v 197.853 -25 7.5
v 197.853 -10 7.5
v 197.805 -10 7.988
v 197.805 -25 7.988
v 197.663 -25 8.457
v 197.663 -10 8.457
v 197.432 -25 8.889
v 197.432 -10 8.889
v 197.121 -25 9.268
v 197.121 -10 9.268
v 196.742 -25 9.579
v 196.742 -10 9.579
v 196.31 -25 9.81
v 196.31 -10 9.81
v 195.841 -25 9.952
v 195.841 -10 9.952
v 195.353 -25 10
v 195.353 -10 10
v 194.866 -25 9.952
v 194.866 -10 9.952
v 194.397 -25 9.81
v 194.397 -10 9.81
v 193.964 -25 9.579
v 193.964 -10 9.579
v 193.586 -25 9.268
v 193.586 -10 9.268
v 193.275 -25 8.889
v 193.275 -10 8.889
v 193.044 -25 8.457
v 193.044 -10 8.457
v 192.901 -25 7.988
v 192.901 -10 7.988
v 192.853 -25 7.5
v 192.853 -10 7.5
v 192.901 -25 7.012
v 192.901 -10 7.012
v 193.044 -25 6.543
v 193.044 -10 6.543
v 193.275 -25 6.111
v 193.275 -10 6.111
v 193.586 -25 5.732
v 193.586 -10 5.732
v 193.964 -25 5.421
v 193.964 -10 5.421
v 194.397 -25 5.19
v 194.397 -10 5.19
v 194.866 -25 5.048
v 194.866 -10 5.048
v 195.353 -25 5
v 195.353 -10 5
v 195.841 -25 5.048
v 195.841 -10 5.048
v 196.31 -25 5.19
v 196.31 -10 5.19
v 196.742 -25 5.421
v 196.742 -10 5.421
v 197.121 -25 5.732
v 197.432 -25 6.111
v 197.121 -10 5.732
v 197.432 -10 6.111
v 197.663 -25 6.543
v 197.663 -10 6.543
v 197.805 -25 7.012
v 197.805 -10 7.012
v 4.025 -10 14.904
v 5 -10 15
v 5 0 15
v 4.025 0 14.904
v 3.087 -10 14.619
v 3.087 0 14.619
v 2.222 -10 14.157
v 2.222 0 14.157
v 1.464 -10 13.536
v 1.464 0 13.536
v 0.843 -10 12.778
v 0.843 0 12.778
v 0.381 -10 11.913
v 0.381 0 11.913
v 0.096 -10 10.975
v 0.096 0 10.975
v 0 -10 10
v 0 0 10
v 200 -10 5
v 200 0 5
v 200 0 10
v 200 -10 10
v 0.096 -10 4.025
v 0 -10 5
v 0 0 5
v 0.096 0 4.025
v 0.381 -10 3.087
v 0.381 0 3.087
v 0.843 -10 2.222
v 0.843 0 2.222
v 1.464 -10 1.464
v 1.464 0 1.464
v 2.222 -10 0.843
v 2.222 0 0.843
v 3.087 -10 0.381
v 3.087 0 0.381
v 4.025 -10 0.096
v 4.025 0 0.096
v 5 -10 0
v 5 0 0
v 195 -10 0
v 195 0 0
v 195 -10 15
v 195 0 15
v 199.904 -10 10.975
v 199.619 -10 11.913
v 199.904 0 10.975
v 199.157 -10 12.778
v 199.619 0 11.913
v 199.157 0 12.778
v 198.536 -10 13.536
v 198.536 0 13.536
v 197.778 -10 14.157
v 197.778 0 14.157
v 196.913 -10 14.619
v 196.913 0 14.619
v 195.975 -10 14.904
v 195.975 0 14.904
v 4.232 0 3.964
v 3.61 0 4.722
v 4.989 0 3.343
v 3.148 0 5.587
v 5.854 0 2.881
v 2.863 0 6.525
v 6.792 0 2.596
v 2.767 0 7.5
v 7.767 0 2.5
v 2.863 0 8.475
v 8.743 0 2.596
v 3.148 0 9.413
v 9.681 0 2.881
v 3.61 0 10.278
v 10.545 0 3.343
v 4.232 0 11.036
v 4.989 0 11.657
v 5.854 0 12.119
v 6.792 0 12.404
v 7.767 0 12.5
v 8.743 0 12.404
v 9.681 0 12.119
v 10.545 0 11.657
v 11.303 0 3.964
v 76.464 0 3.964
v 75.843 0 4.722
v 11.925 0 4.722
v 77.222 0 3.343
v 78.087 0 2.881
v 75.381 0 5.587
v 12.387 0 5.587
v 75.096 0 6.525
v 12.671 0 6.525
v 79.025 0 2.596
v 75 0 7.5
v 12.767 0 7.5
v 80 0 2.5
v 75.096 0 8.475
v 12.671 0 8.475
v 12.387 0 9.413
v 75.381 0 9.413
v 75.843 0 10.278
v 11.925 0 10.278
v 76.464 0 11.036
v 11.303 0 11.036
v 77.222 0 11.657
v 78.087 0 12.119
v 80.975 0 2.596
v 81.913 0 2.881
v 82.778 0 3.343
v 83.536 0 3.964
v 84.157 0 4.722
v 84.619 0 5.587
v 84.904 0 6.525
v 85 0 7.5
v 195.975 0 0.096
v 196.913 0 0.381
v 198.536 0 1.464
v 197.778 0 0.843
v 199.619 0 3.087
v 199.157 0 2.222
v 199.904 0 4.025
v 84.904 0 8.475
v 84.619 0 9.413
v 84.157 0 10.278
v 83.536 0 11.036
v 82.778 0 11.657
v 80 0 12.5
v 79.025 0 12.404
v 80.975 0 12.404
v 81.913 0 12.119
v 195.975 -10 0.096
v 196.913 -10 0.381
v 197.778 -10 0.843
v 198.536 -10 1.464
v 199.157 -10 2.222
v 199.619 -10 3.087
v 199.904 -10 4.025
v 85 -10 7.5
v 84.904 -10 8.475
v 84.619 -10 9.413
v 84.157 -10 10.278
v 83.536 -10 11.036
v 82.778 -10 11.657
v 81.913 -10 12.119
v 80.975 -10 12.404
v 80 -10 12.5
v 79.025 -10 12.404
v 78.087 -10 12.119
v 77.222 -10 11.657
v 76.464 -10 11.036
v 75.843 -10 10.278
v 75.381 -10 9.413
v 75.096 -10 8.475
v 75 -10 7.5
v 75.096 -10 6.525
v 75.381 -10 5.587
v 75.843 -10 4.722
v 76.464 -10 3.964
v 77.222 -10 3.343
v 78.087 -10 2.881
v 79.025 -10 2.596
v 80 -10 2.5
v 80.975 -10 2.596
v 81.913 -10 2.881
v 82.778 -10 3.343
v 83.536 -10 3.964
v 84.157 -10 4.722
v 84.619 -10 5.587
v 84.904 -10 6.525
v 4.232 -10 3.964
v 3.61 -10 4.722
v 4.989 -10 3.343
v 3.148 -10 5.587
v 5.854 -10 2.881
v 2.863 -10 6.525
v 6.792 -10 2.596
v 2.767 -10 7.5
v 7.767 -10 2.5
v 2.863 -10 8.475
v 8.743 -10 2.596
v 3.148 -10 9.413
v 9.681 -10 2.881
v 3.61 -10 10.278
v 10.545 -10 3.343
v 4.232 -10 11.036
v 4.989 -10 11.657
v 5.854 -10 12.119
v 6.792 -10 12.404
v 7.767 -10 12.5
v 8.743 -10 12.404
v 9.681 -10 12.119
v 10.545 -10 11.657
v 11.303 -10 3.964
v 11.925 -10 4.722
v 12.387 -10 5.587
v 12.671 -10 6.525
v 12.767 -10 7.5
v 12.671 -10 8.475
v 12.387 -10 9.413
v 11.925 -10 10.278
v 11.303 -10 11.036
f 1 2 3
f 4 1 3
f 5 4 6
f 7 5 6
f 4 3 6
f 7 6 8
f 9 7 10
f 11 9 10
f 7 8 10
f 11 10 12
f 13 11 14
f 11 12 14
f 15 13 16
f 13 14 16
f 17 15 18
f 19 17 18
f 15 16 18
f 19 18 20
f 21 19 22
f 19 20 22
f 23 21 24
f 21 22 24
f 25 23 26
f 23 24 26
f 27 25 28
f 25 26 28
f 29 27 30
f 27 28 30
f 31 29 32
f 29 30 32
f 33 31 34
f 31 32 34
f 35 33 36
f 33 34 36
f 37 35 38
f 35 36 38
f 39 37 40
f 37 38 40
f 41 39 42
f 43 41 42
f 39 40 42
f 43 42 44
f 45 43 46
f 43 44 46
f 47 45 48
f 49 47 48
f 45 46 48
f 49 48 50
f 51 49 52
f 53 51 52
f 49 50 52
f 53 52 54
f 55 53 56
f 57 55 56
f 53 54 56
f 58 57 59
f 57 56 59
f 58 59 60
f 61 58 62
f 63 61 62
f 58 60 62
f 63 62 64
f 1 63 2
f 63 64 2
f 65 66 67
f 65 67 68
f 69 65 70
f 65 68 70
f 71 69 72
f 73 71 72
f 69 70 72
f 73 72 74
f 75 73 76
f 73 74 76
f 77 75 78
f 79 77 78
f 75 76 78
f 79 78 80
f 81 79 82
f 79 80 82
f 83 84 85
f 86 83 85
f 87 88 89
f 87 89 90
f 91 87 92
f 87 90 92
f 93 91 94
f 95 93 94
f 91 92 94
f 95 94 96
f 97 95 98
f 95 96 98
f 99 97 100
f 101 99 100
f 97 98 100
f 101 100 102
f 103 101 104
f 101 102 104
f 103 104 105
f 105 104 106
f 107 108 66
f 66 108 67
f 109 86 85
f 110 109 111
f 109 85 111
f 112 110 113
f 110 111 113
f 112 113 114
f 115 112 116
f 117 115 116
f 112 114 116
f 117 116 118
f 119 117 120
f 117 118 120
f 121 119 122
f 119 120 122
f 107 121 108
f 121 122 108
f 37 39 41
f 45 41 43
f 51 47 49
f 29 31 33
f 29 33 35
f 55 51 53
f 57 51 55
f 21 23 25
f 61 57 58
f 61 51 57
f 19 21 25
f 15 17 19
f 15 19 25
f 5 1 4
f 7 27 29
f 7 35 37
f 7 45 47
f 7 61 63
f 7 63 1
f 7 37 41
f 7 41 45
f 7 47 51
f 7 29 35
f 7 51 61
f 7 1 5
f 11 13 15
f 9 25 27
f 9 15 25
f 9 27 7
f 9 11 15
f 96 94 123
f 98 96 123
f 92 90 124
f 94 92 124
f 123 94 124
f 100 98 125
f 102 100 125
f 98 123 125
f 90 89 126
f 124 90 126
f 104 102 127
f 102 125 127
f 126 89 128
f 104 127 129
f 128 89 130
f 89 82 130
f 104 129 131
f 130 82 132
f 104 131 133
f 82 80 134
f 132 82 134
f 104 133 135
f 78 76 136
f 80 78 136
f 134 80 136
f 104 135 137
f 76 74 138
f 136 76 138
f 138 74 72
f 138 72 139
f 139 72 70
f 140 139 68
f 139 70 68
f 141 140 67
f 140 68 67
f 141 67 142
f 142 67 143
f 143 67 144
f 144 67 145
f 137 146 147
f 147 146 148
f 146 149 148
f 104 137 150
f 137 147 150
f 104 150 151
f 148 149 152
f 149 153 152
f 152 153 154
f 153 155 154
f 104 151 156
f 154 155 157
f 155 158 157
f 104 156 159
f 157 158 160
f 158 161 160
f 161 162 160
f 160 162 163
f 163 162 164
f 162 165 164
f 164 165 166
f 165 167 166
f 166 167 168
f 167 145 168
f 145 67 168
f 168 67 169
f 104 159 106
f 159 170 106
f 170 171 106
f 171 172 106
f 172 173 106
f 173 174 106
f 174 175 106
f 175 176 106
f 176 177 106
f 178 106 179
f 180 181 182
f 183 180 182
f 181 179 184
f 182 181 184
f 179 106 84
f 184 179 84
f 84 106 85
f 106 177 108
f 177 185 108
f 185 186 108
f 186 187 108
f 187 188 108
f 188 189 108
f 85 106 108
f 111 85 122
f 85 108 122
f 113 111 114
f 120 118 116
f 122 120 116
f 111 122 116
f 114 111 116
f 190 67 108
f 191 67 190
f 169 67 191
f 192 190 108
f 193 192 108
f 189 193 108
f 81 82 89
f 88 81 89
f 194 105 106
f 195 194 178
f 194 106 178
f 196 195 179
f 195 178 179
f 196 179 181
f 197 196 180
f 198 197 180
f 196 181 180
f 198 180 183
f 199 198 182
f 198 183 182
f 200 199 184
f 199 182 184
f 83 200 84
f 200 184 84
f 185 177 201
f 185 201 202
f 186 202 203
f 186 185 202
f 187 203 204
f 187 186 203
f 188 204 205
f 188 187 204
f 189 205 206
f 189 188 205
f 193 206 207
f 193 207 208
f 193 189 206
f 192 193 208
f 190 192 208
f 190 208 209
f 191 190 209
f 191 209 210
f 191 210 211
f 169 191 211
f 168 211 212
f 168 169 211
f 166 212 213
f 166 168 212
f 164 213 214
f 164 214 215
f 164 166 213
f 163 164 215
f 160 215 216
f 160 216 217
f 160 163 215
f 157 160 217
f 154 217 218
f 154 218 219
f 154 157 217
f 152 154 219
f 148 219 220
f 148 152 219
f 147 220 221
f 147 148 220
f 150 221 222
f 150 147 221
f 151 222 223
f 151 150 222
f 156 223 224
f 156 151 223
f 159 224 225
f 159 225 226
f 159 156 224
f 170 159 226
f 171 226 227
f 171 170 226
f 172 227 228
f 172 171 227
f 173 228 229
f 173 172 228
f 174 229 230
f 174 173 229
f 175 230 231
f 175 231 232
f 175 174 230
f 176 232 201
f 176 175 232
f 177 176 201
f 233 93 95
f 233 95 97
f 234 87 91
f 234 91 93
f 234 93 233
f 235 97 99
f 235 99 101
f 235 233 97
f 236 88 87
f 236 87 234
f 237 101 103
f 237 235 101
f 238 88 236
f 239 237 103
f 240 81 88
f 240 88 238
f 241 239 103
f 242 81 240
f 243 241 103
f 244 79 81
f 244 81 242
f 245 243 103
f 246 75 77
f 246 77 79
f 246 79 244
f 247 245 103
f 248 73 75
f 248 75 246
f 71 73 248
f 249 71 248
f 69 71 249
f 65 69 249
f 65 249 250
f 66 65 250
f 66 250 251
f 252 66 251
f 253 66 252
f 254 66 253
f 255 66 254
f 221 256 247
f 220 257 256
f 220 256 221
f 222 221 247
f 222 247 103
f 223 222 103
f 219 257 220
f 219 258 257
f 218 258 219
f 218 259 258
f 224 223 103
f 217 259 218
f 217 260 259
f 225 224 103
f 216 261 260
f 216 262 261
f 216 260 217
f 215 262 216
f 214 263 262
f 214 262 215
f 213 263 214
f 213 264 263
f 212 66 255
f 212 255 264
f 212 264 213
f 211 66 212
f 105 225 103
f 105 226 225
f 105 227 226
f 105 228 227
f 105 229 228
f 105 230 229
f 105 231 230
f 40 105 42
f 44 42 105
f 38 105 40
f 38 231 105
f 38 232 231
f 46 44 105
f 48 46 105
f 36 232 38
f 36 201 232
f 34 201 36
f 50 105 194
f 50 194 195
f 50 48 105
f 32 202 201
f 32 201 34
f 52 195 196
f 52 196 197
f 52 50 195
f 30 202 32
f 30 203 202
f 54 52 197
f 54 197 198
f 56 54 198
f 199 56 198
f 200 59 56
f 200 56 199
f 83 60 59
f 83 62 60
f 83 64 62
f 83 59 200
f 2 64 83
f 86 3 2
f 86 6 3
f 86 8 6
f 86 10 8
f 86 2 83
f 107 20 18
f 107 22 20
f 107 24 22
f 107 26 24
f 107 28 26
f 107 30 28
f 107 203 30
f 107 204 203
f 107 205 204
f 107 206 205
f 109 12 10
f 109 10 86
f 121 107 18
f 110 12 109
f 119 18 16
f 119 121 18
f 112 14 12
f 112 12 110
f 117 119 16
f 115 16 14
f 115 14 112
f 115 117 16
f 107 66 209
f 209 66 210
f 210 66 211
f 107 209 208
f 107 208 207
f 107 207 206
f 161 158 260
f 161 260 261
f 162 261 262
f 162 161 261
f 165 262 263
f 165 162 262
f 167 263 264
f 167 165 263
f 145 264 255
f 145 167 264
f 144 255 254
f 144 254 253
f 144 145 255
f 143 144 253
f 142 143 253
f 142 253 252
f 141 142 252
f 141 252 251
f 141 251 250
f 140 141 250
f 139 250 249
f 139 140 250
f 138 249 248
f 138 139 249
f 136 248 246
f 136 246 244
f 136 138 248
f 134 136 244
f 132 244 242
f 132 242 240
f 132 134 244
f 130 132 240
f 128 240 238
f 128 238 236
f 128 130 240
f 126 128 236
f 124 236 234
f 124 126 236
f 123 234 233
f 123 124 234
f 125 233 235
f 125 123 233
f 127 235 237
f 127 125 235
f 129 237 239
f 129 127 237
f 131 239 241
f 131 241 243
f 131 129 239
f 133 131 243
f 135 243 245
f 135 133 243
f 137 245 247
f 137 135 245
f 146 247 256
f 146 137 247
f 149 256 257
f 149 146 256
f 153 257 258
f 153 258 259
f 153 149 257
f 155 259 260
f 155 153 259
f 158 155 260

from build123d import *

# Parameters (mm, degrees)
F0_R     = 5
F1_DEPTH = 10
F2_R     = 2.5
F3_DEPTH = 15


with BuildPart() as f1:
    # F0 (on Front) → F1 (new body)
    with BuildSketch(Plane.XZ):
        with BuildLine():
            ThreePointArc((0, 5), (1.464466, 1.464466), (5, 0))
            Line((5, 0), (195, 0))
            ThreePointArc((195, 0), (198.535534, 1.464466), (200, 5))
            Line((200, 5), (200, 10))
            ThreePointArc((200, 10), (198.535534, 13.535534), (195, 15))
            Line((195, 15), (5, 15))
            ThreePointArc((5, 15), (1.464466, 13.535534), (0, 10))
            Line((0, 10), (0, 5))
        make_face()
        with Locations((7.767204, 7.5)):
            Circle(F0_R, mode=Mode.SUBTRACT)
        with Locations((80, 7.5)):
            Circle(F0_R, mode=Mode.SUBTRACT)
    extrude(amount=F1_DEPTH)

    # F2 (on face) → F3 (join)
    with BuildSketch(Plane.XZ.offset(10)):
        with Locations((195.353363, 7.5)):
            Circle(F2_R)
    extrude(amount=F3_DEPTH)


solid = f1.part
